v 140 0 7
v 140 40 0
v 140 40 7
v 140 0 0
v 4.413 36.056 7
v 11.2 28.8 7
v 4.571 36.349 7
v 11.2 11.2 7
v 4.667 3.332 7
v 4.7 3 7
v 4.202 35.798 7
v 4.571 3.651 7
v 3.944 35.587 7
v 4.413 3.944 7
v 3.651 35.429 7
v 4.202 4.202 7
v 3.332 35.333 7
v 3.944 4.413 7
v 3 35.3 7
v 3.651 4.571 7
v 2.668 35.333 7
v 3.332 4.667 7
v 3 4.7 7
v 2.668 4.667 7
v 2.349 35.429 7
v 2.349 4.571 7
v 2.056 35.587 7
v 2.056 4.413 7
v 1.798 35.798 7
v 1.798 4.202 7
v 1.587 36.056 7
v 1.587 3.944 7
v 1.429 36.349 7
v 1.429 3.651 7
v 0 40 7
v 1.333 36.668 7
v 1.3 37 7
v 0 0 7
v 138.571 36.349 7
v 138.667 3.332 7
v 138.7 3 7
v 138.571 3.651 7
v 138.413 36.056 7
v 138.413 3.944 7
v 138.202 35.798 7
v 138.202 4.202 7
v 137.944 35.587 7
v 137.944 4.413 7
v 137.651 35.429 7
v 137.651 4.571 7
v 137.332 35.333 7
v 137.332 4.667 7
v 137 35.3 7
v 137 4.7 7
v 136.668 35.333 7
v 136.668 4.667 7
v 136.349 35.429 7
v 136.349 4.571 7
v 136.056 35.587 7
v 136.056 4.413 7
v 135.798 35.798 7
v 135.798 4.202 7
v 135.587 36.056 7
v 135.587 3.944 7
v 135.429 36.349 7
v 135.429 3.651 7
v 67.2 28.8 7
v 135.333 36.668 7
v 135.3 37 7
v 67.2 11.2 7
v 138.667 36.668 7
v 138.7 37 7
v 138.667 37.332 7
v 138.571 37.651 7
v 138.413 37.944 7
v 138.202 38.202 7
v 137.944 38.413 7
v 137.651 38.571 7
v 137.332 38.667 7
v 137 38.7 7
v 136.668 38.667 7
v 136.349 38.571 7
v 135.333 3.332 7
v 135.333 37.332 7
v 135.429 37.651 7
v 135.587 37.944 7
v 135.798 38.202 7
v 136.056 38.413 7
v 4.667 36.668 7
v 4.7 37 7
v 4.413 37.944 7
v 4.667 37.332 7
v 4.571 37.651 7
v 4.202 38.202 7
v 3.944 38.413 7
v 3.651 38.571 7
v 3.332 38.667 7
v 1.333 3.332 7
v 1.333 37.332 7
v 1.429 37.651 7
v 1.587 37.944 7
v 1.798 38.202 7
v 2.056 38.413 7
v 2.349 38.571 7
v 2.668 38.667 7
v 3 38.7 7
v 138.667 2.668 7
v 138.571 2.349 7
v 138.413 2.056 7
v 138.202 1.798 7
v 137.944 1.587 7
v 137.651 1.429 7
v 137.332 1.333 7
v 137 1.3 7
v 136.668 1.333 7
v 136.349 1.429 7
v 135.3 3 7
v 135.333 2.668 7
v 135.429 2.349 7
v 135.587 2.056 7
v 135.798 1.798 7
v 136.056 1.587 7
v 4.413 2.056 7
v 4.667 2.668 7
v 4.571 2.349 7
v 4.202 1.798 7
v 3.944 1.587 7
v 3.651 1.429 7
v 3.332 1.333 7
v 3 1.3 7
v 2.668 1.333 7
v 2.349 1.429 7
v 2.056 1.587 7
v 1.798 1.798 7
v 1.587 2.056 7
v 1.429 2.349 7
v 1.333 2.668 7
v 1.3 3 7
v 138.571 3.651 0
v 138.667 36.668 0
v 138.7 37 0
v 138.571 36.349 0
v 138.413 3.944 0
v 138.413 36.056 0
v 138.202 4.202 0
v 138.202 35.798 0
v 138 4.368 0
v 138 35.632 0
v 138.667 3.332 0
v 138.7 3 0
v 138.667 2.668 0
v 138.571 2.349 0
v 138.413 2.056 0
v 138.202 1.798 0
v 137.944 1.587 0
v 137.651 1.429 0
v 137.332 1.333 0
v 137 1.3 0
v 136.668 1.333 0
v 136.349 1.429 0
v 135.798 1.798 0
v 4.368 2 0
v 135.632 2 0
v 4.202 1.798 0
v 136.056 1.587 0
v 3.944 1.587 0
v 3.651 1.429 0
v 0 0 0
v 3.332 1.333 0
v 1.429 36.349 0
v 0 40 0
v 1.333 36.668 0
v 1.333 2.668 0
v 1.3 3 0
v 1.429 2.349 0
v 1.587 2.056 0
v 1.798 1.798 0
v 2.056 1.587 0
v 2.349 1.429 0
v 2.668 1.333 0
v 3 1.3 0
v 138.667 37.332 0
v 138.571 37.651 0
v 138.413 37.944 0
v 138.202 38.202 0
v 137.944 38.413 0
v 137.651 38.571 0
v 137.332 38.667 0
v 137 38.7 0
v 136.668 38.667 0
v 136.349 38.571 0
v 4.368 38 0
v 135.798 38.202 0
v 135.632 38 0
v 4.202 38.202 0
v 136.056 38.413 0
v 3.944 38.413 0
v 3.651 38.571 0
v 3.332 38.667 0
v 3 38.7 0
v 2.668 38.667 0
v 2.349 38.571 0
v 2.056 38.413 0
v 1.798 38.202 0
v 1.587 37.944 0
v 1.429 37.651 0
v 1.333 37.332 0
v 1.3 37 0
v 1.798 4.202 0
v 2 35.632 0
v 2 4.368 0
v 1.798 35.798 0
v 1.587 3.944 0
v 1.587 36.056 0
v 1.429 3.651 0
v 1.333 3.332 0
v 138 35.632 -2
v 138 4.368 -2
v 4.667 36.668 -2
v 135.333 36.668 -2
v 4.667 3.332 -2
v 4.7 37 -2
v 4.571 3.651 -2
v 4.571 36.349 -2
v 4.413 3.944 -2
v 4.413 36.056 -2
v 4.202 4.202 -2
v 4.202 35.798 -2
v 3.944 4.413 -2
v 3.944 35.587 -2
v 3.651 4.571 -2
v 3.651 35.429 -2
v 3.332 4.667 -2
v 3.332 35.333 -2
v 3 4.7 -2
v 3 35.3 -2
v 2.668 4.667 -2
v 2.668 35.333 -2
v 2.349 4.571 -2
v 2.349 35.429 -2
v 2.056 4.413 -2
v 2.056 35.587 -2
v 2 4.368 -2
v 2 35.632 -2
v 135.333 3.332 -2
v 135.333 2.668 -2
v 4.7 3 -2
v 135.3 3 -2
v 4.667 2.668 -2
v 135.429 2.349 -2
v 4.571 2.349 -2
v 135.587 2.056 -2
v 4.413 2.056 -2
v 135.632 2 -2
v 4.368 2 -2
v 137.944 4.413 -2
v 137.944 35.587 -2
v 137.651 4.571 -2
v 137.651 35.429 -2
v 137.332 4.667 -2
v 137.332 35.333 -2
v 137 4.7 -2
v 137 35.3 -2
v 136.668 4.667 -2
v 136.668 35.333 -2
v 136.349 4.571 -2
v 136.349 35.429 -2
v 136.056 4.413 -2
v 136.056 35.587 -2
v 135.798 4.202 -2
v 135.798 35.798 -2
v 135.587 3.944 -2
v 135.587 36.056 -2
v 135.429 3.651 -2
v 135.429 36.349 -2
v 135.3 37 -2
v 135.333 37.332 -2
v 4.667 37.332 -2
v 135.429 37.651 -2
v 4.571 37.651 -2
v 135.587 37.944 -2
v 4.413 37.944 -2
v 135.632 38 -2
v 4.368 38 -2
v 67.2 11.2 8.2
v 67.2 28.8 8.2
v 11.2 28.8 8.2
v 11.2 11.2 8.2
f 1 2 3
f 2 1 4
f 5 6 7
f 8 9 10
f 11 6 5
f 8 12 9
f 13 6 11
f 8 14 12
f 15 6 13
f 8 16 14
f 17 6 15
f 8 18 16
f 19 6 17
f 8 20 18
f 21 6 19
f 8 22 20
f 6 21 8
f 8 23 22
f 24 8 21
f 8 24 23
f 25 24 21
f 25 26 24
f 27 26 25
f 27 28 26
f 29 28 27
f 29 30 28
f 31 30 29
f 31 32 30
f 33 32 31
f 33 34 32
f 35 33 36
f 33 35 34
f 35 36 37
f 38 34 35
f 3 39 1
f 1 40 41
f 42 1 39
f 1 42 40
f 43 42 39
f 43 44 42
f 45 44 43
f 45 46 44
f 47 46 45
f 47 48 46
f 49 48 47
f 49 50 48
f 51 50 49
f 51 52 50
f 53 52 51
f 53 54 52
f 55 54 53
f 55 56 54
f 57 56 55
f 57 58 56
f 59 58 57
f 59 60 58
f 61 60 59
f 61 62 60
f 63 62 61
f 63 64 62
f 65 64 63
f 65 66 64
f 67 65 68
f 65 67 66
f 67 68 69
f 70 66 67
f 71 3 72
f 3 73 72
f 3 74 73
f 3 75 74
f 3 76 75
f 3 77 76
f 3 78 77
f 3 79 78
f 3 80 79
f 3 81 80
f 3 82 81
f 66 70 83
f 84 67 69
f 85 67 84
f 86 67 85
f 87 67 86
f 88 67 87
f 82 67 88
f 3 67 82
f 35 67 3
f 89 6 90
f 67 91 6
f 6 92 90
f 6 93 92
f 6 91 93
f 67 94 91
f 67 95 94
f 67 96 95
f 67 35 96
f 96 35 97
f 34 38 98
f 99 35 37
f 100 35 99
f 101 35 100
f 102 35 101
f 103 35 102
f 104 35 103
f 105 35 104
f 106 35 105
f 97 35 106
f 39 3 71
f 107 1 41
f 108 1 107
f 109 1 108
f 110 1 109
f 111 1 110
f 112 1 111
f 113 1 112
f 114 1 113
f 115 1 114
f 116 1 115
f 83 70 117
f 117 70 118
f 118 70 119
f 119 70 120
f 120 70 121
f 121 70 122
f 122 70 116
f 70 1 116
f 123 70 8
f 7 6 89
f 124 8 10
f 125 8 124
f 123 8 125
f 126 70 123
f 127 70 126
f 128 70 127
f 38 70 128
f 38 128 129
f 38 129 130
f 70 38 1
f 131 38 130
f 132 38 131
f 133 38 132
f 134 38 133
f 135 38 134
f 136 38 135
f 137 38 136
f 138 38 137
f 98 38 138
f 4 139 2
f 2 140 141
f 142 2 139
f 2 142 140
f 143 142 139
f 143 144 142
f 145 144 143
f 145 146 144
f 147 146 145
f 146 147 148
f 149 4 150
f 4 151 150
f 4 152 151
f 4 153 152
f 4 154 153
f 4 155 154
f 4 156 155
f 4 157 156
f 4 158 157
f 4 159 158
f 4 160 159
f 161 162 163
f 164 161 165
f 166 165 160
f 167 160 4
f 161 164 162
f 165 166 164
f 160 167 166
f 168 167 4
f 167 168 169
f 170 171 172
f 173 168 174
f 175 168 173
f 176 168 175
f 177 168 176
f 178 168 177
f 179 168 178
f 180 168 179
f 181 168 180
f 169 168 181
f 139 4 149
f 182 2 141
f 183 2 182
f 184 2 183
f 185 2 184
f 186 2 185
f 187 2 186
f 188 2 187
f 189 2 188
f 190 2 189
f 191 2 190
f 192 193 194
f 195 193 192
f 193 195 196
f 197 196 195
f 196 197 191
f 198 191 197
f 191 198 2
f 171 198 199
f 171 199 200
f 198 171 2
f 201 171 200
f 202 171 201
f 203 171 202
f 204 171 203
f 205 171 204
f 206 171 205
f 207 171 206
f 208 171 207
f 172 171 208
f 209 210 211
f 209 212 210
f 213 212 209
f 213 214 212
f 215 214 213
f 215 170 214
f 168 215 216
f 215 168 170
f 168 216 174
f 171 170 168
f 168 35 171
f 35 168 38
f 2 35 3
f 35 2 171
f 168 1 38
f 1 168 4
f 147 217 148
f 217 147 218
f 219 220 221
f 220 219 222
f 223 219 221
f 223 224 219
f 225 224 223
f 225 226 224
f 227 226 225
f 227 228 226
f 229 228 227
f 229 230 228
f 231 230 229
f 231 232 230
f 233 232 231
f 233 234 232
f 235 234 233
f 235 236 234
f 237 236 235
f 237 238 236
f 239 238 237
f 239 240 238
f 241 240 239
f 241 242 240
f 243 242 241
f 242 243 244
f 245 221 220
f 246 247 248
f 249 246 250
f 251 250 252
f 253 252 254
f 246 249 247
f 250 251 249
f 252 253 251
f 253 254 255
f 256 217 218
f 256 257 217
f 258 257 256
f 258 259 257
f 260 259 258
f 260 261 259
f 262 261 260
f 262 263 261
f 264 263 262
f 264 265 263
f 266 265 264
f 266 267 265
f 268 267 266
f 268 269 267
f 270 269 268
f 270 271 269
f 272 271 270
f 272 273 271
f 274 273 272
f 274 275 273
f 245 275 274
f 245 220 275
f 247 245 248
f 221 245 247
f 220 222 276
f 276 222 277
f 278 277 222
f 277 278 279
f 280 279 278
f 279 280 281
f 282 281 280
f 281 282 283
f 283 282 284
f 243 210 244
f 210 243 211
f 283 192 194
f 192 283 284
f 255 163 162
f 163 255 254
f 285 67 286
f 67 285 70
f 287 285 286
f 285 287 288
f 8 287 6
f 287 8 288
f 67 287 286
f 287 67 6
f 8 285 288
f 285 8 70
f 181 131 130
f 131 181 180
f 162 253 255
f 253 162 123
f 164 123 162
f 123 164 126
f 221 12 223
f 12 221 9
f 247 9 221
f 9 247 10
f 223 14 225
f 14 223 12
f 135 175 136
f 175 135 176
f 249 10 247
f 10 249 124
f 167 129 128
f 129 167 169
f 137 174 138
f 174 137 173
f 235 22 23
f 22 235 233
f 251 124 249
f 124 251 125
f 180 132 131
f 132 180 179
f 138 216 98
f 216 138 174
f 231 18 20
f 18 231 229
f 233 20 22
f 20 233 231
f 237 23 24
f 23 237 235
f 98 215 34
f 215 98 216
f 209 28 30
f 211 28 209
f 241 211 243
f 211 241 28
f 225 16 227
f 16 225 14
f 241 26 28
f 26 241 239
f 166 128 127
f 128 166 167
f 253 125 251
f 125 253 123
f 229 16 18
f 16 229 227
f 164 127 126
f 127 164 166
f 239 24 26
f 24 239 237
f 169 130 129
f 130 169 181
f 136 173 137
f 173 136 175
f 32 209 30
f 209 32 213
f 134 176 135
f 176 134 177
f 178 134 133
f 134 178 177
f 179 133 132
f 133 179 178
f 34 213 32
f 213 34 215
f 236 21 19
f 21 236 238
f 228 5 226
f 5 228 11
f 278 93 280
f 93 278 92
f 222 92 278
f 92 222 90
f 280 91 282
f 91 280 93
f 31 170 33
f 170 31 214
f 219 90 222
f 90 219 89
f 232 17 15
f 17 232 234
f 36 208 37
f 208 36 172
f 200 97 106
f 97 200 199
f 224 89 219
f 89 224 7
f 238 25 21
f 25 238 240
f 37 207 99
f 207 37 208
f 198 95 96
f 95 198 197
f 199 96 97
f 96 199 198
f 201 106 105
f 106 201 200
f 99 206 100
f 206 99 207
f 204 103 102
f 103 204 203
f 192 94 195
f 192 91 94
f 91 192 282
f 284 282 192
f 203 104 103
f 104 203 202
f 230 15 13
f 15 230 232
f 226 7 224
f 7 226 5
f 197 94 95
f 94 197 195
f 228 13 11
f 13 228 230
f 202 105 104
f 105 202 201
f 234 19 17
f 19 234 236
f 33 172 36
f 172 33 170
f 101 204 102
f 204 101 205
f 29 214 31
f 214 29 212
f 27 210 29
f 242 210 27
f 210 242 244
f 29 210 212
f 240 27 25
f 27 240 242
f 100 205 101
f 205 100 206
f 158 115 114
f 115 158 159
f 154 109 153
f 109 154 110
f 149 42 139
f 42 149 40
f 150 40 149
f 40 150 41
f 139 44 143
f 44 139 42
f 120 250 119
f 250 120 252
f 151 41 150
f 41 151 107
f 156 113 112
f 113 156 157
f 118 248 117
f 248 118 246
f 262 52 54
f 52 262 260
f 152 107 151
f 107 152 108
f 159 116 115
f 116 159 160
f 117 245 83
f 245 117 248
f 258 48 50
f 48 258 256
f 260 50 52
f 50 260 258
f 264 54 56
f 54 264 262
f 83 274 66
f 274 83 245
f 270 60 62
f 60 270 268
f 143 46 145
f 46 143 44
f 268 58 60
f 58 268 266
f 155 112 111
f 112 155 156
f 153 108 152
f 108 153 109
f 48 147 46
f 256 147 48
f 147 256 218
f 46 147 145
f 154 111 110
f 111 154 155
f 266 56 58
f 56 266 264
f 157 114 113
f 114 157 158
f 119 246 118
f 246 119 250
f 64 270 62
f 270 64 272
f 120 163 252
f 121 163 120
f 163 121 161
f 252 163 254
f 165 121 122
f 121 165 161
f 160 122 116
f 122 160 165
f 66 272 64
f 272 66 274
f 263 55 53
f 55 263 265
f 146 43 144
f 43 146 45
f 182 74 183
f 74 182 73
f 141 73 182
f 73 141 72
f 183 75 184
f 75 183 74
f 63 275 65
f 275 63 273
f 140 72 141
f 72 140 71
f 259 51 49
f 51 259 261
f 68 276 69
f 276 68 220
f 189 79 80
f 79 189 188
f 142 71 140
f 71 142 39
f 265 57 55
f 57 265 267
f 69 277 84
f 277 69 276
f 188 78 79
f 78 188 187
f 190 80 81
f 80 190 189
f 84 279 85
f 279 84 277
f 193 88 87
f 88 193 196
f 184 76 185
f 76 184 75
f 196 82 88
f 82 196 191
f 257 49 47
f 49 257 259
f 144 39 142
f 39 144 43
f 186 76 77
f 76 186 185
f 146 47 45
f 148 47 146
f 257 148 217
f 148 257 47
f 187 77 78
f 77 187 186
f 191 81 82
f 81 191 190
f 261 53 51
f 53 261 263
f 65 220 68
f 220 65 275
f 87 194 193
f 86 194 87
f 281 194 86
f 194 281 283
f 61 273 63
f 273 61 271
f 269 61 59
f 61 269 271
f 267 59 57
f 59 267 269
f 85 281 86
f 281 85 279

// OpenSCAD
$fn = 32;

// ----------------------------------------------------------------------
// Enclosure lid: 140 x 40 x 7 mm, 4 bolt holes
// ----------------------------------------------------------------------

// --- parameters (mm) ---
length = 140;             // lid length, X
width = 40;               // lid width, Y
plate_t = 7;              // lid plate thickness
bolt_d = 3.4;             // bolt clearance
boss_lip = 3;             // bolt hole inset from the corner
sink = 1;                 // overlap of the lip and ribs into the plate
lip_h = 3;                // lip height below the plate
lip_wall = 2;             // lip wall thickness
label_h = 1.2;            // raised marking pad

module plate() {
  cube([length, width, plate_t]);
  /* lip that drops into the housing opening, sunk into the plate */
  translate([lip_wall, lip_wall, -lip_h + sink]) cube([length - 2 * lip_wall, width - 2 * lip_wall, lip_h]);
  /* raised marking pad on top, sunk 1 mm into the plate */
  translate([length * 0.08, width * 0.28, plate_t - 1]) cube([length * 0.4, width * 0.44, label_h + 1]);
}

difference() {
  plate();
  /* bolt pattern matching the corner bosses */
  for (sx = [0, 1]) for (sy = [0, 1])
    translate([sx * (length - 2 * boss_lip) + boss_lip, sy * (width - 2 * boss_lip) + boss_lip, -lip_h - 1])
      cylinder(h = plate_t + lip_h + 2, d = bolt_d);
}
